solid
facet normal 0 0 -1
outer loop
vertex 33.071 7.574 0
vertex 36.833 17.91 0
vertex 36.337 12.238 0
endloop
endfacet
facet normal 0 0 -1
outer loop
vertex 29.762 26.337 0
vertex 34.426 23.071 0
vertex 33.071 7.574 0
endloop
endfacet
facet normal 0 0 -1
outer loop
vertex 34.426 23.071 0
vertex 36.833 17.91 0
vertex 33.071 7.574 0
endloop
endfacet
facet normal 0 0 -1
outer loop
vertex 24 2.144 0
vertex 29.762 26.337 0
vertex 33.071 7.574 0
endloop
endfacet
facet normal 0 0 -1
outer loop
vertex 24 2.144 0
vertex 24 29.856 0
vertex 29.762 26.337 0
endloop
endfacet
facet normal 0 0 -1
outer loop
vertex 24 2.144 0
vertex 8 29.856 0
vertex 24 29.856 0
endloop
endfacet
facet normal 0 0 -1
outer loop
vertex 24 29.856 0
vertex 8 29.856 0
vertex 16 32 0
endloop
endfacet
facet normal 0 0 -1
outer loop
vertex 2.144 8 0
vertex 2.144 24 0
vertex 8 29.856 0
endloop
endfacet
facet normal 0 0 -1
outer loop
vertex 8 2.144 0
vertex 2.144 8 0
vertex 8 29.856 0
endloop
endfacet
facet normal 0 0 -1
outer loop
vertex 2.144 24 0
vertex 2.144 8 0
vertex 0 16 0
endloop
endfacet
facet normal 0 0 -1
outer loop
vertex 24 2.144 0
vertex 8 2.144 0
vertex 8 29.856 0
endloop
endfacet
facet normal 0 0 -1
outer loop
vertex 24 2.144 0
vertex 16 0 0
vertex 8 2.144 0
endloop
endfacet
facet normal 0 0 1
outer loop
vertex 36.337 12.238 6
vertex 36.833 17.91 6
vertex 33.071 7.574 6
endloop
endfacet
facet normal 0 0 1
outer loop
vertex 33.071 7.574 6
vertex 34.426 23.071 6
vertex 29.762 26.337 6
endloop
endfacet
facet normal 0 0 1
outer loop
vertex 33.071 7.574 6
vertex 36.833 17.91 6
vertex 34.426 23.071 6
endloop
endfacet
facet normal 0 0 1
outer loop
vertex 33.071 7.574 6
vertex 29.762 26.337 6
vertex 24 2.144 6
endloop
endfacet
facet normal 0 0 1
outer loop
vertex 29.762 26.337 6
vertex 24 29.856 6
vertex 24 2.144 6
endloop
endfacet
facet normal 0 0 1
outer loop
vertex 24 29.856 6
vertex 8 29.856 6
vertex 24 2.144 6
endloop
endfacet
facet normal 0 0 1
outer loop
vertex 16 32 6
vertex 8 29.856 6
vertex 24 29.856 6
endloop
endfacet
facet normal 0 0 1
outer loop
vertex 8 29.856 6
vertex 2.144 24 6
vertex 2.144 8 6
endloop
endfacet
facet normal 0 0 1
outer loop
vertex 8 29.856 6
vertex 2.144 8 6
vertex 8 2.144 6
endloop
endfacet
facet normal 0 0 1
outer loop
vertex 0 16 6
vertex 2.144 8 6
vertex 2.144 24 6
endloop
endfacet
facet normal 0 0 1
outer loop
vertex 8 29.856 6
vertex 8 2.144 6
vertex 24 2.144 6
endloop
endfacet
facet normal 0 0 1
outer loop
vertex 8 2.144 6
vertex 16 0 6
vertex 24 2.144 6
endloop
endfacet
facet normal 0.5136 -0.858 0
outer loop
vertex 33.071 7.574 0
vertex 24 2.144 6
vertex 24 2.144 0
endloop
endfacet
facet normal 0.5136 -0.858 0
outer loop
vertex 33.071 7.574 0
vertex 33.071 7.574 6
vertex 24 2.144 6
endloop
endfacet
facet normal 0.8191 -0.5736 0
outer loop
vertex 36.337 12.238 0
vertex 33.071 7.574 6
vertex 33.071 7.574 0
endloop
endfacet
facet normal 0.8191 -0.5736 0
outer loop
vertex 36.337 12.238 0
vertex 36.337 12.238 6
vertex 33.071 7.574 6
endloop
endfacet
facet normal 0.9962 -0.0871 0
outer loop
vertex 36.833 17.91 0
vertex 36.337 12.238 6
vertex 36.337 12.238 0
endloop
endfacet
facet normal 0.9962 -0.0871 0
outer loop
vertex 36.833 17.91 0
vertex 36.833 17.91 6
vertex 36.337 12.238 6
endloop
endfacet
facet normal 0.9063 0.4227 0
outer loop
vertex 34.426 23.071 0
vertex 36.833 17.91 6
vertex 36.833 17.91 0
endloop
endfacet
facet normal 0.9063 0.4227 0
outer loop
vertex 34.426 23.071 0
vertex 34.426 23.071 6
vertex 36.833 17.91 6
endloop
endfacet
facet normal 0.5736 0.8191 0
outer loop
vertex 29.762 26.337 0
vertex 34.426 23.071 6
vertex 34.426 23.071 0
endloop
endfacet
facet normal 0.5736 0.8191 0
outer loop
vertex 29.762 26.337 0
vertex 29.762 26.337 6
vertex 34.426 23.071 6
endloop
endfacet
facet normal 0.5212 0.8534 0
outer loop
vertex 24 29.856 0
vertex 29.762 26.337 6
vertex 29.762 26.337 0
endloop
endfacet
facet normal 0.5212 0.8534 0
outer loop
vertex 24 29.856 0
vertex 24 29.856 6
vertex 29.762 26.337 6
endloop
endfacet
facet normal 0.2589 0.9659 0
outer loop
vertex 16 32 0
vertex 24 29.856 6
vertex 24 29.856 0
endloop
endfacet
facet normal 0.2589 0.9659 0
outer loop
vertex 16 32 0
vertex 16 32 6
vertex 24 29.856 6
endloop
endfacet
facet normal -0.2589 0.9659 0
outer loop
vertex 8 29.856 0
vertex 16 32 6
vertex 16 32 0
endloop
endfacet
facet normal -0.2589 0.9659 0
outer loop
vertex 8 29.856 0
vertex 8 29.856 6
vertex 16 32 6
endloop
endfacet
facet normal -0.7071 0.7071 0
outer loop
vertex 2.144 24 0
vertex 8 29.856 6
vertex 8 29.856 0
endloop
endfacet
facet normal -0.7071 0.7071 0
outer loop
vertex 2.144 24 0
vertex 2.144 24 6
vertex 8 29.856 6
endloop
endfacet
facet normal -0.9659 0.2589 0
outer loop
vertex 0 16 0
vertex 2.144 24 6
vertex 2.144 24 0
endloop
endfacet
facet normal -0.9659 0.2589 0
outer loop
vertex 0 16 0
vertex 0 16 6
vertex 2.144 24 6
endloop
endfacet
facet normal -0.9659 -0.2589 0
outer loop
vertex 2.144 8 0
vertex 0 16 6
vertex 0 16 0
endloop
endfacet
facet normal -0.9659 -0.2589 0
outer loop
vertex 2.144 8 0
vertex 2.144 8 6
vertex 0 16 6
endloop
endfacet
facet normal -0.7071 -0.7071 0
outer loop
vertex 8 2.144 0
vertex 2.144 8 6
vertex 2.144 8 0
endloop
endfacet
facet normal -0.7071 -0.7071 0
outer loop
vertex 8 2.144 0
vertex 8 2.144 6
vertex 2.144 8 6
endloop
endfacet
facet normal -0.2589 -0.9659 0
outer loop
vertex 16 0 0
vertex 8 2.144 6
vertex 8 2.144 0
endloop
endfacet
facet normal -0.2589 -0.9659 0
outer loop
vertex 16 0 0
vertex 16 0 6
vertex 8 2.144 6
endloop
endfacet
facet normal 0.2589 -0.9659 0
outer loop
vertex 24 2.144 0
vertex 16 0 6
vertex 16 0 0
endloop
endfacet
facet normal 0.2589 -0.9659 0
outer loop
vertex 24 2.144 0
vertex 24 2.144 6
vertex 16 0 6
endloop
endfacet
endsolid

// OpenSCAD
$fn = 32;

// ----------------------------------------------------------------------
// Eccentric disc: step, 6 mm thick
// ----------------------------------------------------------------------

// --- parameters (mm) ---
profile_height = 6;       // extrusion height
profile_points = 14;      // points of the closed outline

profile = [[0, 16], [2.144, 8], [8, 2.144], [16, 0], [24, 2.144], [33.071, 7.574], [36.337, 12.238], [36.833, 17.91], [34.426, 23.071], [29.762, 26.337], [24, 29.856], [16, 32], [8, 29.856], [2.144, 24]];  // single closed polygon, 14 points, counter clockwise

// --- the one profile operation ---
linear_extrude(height = profile_height) polygon(points = profile);
